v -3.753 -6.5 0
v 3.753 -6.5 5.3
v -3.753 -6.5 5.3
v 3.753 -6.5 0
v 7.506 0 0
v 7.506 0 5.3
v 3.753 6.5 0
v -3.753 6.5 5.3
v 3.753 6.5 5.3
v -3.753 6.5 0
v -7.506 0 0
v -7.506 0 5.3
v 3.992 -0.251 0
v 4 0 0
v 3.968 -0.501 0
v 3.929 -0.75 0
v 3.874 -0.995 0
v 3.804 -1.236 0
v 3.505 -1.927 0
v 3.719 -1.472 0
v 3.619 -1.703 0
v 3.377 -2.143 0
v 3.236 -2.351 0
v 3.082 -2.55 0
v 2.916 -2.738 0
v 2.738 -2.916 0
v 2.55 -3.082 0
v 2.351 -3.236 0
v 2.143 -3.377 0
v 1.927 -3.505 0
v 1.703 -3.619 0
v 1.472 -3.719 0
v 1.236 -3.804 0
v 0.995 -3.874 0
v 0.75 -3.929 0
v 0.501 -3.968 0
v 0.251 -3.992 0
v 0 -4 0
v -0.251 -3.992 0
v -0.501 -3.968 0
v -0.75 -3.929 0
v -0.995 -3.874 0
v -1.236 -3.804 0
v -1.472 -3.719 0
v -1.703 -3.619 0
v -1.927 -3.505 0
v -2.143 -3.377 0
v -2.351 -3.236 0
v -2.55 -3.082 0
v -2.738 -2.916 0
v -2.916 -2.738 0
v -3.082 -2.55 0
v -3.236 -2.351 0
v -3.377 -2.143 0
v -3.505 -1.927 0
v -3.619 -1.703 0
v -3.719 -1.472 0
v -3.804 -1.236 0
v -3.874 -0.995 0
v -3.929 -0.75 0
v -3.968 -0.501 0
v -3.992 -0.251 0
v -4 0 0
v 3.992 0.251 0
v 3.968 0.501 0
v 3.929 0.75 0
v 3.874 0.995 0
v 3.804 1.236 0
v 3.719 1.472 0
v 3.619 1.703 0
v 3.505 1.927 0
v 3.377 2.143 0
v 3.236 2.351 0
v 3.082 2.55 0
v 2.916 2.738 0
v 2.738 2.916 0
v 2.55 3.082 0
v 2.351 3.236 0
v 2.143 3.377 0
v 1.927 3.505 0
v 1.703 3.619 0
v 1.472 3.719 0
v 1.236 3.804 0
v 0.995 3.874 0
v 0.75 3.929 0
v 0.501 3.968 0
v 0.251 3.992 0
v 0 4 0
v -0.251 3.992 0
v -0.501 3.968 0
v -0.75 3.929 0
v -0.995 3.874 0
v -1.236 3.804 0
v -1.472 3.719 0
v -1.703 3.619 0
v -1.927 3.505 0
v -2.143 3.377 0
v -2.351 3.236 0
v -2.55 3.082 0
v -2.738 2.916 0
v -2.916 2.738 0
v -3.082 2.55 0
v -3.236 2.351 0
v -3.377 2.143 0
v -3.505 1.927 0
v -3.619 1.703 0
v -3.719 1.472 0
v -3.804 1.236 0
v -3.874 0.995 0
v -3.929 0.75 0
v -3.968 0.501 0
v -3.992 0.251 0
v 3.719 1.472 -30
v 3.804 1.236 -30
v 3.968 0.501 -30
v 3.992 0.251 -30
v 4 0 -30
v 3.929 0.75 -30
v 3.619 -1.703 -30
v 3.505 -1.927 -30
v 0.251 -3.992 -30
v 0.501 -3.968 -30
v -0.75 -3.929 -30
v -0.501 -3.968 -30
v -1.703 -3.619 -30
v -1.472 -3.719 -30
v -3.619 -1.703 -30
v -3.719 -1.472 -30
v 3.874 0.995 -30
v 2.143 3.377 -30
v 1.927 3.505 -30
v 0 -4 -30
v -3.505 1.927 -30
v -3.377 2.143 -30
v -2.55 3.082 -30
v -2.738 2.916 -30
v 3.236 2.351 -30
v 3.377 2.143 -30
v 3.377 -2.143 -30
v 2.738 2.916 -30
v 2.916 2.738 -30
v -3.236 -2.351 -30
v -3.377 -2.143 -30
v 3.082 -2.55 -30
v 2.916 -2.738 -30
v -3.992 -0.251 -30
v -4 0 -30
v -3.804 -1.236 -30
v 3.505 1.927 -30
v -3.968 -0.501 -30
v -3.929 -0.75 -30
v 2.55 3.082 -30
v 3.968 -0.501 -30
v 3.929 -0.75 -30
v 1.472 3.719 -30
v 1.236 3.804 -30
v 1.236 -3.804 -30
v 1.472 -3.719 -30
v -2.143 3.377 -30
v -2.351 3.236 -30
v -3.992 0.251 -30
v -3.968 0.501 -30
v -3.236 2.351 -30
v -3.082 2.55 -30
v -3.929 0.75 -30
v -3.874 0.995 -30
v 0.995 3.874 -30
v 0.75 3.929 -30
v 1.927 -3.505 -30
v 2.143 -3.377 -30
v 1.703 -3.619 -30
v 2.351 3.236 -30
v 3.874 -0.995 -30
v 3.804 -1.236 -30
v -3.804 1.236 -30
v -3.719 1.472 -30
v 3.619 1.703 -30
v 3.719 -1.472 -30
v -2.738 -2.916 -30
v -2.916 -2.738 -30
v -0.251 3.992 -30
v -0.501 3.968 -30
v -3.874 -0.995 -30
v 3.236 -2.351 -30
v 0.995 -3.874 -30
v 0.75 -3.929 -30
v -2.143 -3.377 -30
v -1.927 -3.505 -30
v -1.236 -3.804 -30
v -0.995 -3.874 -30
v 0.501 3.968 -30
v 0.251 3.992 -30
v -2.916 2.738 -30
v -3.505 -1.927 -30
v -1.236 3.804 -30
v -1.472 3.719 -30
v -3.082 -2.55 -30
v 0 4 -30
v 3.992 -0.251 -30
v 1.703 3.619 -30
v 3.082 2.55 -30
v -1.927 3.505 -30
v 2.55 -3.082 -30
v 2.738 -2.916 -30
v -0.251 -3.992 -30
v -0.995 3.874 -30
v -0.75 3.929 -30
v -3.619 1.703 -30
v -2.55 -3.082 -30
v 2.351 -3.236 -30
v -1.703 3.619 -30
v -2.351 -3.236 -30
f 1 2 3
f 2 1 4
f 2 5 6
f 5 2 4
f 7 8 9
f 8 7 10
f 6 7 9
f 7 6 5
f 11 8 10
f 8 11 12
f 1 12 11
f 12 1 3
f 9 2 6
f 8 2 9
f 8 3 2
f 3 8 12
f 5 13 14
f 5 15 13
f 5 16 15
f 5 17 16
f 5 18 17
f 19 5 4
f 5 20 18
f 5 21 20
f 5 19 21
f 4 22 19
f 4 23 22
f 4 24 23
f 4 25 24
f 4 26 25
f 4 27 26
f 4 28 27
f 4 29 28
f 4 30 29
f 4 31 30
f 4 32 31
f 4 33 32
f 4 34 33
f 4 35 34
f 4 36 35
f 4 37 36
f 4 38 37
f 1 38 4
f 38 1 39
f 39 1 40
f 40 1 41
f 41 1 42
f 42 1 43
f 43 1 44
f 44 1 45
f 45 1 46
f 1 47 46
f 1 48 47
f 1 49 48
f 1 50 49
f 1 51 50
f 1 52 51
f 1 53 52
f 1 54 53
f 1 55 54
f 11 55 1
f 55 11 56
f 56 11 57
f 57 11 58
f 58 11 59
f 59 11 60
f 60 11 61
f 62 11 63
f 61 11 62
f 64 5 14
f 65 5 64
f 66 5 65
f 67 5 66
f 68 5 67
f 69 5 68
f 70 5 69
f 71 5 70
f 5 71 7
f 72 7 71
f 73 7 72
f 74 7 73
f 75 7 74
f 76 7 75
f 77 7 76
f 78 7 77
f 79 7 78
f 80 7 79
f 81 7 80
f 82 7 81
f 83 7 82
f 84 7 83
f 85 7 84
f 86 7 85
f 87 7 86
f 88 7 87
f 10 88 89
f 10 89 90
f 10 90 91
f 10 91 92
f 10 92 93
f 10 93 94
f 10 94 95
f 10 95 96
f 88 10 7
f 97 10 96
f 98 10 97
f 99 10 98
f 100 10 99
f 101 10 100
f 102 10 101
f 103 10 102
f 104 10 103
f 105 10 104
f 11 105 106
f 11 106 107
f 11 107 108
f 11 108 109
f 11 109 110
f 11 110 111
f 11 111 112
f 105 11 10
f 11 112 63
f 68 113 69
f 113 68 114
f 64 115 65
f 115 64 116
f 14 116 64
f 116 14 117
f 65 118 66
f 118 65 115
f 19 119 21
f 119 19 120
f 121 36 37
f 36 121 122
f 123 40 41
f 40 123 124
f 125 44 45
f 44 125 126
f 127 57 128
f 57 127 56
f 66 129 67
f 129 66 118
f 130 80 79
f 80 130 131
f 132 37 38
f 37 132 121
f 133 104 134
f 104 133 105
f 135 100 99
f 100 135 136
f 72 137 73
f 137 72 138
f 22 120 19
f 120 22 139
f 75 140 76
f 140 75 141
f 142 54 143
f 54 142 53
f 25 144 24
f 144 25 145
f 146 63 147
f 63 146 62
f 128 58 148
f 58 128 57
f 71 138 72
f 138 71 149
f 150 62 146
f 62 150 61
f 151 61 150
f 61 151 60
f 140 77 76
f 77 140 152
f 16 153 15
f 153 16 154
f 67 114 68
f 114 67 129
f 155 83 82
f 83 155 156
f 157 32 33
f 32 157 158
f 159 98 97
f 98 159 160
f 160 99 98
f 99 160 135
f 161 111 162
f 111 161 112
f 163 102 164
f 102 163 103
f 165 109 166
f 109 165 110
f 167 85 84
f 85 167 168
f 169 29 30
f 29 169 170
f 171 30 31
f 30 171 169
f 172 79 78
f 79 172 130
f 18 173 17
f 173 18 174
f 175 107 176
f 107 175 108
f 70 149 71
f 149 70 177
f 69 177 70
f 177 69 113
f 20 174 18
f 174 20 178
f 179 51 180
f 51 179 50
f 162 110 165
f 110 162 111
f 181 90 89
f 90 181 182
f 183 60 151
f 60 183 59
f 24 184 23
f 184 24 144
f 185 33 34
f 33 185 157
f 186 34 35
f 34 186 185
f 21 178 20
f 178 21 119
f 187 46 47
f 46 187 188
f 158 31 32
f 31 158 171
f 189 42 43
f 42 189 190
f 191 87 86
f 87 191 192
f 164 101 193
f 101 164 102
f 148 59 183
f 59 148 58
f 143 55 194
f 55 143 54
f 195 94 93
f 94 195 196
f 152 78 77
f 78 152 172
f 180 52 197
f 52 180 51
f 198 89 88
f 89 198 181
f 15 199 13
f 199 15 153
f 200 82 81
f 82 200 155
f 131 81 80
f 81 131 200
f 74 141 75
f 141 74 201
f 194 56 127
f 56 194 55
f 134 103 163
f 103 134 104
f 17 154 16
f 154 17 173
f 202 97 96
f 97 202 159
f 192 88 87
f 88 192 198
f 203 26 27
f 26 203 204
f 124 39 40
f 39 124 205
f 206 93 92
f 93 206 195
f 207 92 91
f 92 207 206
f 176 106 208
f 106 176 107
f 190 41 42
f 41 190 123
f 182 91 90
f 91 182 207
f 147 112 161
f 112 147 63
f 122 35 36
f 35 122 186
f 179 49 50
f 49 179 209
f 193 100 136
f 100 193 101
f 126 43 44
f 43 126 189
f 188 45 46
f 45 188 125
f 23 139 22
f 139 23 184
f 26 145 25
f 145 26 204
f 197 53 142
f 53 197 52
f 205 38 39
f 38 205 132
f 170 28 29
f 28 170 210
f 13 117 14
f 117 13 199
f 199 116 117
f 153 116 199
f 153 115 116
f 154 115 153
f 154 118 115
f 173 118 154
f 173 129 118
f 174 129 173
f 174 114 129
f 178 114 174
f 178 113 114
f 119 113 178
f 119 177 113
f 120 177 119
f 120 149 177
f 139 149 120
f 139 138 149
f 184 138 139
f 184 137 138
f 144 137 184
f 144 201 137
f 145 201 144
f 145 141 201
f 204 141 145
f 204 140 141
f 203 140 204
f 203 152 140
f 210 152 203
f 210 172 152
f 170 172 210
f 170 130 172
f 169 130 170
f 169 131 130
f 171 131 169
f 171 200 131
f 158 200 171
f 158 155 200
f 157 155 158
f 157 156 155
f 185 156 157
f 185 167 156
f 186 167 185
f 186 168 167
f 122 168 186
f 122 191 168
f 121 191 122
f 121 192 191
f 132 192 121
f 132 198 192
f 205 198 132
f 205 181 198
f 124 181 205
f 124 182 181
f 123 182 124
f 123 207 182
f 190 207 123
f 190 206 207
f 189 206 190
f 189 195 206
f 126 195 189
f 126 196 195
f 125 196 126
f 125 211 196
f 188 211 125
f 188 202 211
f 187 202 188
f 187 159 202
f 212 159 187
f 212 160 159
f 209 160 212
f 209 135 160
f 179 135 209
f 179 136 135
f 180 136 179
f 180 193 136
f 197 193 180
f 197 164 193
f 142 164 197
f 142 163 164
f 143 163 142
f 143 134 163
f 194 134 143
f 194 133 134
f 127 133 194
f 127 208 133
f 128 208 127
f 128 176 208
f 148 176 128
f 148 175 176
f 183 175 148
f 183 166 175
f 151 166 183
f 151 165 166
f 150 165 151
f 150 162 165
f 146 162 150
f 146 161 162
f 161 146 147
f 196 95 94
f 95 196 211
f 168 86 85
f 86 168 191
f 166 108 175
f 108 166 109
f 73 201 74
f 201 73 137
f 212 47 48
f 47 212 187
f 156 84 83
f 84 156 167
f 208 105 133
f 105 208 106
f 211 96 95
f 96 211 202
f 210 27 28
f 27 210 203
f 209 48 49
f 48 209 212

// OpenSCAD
af = 13;
head_h = 5.3;
shank_d = 8;
shank_l = 30;

union() {
    cylinder(h = head_h, d = 2 * af / sqrt(3), $fn = 6);

    translate([0, 0, -shank_l])
        cylinder(h = shank_l, d = shank_d, $fn = 100);
}
